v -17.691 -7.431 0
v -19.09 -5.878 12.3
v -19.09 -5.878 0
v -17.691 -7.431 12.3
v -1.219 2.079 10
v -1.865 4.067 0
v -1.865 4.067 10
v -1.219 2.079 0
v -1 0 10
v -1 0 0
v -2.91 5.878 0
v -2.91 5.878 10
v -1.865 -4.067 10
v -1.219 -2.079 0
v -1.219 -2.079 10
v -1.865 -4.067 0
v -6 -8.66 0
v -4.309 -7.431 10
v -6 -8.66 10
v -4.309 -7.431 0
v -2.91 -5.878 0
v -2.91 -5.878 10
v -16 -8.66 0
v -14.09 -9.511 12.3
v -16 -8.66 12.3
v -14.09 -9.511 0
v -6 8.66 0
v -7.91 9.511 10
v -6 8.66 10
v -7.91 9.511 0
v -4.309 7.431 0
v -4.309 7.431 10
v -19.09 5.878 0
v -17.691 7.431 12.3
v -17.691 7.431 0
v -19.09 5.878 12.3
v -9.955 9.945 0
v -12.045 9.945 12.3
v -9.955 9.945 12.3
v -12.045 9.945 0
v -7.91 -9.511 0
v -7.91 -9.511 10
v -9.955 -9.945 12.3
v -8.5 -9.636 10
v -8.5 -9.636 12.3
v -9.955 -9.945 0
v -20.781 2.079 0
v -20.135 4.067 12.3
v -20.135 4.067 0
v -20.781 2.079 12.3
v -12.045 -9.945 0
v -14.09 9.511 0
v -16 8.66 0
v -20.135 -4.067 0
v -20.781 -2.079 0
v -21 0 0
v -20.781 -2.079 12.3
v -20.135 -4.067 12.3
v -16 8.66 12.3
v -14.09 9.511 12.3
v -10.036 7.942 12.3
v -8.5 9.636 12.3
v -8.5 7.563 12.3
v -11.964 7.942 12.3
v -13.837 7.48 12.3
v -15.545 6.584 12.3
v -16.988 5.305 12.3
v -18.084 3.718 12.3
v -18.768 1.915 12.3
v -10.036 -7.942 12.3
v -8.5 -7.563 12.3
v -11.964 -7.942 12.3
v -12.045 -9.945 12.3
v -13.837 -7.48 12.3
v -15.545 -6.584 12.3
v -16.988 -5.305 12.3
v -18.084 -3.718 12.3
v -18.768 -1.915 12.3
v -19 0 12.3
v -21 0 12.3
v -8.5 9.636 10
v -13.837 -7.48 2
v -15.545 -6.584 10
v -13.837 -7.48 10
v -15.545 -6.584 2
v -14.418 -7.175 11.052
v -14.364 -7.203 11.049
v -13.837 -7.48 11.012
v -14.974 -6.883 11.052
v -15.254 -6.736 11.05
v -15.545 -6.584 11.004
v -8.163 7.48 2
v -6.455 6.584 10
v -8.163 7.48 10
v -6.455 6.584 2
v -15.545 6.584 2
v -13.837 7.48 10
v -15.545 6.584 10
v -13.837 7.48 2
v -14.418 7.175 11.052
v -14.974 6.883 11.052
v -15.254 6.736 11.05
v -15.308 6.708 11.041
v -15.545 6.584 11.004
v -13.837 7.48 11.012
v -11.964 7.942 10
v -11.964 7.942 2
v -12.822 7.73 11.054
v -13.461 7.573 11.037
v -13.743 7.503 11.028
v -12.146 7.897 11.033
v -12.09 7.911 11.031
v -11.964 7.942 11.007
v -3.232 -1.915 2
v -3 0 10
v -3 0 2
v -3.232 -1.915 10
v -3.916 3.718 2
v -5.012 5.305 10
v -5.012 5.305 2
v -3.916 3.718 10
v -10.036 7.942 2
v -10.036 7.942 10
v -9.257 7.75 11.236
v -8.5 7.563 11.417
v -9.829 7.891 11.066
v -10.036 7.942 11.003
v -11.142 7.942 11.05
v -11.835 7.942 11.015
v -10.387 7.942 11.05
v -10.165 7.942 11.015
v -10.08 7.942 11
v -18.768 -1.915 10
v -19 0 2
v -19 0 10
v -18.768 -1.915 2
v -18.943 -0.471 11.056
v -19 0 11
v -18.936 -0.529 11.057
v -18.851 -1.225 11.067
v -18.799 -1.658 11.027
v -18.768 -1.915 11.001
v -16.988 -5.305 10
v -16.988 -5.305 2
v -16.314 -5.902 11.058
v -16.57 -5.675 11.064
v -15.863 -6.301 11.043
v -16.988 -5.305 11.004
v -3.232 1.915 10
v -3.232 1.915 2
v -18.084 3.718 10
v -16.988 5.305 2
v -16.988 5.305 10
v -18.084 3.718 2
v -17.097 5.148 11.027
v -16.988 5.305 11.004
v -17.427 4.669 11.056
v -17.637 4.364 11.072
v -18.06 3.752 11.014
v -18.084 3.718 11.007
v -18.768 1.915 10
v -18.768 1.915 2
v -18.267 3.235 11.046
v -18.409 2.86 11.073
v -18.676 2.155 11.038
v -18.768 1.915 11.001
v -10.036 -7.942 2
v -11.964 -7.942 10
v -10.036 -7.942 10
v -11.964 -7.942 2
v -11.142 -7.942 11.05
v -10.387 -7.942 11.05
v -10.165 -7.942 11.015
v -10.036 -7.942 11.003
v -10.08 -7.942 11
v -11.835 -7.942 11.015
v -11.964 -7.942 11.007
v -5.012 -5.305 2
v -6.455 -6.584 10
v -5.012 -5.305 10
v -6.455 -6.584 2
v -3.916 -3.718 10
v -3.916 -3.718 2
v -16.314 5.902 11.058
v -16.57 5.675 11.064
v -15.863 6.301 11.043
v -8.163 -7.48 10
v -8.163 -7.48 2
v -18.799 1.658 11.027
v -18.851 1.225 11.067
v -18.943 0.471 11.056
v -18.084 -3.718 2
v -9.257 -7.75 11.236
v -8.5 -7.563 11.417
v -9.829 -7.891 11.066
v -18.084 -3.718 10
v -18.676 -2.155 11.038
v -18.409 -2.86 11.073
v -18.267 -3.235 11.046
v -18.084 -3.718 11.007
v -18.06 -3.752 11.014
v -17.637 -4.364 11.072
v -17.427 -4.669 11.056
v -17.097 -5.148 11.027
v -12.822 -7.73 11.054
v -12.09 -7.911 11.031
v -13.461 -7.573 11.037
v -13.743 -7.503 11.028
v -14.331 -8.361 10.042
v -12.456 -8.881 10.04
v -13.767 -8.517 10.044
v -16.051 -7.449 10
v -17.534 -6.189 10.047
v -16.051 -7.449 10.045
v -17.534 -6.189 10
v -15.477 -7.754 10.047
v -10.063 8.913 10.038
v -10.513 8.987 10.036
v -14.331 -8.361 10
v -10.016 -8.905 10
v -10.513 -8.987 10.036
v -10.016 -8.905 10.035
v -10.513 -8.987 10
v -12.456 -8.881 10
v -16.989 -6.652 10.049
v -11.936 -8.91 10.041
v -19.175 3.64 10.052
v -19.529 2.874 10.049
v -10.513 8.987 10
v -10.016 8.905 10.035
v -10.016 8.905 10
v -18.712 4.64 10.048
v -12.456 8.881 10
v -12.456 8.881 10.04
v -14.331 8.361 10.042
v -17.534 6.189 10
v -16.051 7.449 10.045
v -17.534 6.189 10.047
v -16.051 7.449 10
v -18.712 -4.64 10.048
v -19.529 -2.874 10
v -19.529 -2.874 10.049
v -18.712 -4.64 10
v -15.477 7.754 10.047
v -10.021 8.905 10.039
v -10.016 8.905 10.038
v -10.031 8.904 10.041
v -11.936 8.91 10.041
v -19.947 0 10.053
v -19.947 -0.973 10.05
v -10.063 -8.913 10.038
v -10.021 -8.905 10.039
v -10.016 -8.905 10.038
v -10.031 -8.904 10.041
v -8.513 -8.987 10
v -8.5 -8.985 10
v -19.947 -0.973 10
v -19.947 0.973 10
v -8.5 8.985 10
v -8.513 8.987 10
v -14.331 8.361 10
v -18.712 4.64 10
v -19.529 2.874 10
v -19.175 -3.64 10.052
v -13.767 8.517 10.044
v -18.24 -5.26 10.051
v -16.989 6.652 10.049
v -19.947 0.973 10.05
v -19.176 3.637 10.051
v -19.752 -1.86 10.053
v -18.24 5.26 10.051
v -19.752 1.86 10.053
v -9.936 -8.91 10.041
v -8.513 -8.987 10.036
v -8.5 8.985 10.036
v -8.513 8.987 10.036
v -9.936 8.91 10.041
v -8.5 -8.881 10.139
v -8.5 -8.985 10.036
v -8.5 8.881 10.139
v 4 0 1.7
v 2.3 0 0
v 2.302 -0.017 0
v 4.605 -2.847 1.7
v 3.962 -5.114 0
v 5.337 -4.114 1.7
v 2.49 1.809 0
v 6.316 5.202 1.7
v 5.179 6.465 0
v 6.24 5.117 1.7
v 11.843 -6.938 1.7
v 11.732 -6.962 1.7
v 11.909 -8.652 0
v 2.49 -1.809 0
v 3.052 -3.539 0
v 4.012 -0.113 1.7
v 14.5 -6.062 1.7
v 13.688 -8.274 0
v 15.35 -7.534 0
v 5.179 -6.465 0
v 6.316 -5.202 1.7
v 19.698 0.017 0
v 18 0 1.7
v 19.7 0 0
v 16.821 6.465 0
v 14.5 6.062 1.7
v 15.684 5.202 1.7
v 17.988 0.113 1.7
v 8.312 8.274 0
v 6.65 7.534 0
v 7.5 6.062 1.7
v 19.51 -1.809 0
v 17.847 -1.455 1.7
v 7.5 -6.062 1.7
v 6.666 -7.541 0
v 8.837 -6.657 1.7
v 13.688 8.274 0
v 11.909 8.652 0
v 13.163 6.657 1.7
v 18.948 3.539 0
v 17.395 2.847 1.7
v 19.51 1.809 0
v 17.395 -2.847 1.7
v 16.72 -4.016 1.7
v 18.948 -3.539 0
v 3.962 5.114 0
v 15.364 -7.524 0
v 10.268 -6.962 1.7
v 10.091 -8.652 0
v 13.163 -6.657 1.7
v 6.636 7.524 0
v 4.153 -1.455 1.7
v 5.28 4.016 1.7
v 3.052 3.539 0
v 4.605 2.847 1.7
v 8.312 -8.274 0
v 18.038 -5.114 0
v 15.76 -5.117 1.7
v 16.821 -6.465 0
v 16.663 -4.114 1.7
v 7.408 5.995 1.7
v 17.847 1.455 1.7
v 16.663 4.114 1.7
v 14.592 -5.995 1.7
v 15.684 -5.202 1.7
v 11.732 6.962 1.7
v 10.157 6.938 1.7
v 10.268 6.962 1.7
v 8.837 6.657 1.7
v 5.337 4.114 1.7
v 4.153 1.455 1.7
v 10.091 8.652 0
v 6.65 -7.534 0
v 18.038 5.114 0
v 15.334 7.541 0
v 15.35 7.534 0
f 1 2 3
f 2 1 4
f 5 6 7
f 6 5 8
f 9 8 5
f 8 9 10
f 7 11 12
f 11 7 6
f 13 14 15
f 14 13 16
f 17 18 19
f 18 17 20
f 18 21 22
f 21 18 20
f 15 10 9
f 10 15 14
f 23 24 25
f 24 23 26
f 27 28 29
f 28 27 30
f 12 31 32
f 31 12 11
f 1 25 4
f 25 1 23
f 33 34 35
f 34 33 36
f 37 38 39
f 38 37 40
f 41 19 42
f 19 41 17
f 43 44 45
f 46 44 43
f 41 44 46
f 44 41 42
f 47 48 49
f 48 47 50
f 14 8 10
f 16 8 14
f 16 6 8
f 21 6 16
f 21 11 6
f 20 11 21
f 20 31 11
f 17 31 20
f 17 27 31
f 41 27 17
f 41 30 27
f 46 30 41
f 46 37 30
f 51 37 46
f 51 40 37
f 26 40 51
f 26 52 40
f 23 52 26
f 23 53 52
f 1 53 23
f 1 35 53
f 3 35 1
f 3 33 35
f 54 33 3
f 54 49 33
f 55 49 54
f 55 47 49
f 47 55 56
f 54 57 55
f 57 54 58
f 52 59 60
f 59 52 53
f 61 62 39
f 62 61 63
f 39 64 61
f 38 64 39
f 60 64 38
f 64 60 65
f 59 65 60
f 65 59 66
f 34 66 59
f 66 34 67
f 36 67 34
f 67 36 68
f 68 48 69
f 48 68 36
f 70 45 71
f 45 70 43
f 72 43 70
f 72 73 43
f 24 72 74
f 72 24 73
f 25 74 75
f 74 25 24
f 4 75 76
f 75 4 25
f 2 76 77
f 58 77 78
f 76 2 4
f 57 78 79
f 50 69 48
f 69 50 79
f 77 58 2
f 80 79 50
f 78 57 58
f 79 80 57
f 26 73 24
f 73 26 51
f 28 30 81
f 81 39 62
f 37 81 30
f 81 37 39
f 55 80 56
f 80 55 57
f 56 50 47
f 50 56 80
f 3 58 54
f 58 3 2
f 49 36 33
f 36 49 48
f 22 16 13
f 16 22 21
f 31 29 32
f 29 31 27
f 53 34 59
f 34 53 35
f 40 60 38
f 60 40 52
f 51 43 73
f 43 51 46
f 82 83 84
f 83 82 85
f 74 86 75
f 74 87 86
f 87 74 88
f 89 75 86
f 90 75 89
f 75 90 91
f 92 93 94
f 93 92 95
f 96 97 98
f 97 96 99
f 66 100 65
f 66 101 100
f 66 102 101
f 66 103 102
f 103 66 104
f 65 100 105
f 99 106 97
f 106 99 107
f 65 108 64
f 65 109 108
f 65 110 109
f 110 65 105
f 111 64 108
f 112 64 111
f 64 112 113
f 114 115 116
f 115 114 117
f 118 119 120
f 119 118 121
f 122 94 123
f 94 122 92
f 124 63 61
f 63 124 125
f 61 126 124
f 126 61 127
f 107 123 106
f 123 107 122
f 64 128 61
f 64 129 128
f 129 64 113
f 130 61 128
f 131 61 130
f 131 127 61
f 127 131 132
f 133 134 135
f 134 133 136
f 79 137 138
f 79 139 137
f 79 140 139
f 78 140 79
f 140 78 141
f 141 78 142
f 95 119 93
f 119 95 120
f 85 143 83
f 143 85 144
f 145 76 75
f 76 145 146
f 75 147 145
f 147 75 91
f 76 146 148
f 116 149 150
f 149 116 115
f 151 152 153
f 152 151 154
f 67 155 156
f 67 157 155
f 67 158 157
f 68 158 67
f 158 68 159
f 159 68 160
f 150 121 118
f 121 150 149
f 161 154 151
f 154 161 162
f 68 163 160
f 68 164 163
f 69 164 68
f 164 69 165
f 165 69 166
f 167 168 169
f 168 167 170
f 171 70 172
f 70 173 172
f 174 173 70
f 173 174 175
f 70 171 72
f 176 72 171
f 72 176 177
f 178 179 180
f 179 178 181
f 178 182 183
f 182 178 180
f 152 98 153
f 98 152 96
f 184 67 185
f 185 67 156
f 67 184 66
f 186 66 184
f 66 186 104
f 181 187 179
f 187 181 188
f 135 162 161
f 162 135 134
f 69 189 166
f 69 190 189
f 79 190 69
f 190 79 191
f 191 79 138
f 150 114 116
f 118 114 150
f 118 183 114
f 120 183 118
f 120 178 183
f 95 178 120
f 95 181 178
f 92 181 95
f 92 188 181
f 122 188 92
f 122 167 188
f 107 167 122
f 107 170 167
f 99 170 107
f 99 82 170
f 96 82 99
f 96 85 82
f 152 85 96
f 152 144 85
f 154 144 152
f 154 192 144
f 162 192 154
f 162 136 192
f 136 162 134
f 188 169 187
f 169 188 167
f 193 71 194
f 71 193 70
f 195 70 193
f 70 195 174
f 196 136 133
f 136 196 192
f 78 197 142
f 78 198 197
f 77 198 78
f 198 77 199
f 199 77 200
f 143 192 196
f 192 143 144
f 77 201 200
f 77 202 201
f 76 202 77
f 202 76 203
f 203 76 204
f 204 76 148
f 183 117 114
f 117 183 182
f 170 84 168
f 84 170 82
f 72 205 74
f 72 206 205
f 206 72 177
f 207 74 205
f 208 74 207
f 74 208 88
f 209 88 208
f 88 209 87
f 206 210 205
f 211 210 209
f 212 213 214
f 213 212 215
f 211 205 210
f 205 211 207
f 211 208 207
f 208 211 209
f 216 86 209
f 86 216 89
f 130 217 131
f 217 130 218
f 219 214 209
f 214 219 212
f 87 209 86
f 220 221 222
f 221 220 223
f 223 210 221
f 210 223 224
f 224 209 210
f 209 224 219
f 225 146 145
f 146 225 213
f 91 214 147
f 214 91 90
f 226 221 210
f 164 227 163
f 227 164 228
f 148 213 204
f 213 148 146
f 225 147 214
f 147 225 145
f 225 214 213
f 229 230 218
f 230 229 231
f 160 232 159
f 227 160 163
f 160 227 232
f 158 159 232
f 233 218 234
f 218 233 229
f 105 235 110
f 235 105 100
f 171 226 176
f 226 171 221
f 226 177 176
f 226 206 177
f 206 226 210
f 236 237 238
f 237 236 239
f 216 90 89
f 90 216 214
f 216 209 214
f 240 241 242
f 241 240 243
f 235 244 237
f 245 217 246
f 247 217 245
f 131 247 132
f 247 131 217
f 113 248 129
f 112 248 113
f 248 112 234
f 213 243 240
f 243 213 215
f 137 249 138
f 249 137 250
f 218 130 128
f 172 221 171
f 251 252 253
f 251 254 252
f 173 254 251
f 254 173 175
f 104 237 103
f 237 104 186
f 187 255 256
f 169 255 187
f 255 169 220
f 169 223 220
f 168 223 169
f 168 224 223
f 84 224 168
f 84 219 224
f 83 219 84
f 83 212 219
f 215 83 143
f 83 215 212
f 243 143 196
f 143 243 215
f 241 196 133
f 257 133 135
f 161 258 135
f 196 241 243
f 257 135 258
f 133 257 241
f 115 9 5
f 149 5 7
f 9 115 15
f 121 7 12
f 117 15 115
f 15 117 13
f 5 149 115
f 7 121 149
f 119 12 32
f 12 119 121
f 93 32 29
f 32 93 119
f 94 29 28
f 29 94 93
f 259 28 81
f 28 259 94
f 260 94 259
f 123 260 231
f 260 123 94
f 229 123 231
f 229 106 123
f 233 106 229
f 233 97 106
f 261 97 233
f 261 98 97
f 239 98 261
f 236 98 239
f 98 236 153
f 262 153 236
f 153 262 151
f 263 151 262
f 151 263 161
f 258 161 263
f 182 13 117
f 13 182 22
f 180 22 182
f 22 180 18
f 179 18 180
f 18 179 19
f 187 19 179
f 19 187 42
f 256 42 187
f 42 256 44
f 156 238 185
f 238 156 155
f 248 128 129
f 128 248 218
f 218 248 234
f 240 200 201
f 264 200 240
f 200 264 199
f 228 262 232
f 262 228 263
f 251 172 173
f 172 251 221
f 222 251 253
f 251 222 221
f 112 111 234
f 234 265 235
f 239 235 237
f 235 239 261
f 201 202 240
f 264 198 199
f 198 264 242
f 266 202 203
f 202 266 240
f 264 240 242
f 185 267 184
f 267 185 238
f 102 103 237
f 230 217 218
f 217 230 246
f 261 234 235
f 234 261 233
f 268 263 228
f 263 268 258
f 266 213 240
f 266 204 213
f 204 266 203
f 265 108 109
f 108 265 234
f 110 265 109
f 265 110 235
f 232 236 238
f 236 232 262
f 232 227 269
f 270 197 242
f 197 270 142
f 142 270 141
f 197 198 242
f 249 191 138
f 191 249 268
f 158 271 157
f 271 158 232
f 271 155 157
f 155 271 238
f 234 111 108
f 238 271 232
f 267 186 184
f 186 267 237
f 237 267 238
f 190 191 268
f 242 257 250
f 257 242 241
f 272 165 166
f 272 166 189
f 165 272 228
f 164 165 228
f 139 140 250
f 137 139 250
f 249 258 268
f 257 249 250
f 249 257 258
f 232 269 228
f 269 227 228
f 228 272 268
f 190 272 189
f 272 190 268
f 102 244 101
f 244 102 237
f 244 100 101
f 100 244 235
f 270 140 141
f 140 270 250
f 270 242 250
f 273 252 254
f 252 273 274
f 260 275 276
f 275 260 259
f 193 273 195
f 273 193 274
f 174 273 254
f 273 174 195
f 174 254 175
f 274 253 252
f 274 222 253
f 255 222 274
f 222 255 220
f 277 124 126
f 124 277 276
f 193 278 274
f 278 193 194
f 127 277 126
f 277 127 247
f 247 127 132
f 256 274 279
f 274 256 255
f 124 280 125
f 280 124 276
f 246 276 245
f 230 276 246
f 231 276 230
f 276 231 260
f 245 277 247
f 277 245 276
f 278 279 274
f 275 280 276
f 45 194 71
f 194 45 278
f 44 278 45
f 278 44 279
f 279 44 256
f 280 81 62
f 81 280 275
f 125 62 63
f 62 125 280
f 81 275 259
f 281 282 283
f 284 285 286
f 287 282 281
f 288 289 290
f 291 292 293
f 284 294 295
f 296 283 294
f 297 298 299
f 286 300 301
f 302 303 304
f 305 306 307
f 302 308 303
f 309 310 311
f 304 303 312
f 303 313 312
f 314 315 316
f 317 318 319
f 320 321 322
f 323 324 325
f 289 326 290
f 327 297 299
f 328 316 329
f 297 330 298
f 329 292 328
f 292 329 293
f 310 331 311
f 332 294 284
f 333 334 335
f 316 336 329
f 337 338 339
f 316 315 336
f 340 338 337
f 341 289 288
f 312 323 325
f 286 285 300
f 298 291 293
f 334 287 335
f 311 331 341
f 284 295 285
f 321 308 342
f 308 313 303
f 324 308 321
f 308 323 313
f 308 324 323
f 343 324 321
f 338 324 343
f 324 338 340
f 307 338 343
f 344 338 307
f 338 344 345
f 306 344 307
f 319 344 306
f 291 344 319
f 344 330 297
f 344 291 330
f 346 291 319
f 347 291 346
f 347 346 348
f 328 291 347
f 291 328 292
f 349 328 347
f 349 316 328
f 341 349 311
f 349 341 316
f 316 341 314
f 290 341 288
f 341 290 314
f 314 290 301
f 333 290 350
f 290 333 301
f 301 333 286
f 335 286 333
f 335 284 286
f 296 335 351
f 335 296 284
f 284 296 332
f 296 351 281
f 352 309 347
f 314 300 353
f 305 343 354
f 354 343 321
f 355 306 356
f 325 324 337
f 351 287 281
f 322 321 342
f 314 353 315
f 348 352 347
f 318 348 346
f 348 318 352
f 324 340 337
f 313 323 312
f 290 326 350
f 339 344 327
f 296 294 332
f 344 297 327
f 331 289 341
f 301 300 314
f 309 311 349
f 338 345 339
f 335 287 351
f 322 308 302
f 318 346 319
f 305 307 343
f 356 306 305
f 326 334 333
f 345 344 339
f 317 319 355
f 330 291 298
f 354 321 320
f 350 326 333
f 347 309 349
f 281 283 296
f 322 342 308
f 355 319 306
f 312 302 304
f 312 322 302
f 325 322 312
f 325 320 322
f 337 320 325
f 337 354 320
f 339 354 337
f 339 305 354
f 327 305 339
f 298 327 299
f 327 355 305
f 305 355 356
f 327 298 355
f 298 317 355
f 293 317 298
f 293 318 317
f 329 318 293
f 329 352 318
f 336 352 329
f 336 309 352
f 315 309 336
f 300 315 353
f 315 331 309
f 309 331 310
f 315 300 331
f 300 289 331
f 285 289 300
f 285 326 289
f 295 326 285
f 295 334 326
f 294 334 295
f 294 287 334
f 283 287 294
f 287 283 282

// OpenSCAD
//Author: Devin Grady
//License: CC BY 3.0 US ( http://creativecommons.org/licenses/by/3.0/us/ )

//Inner radius (open space in interior)
radius = 10; 

//Inner height (open space in interior)
height = 10; 

//Maximum wall thickness; will be cut into to fit lid.
wall = 2; 

//Fit tolerance parameter.
tolerance = .3; 

module cylinder_box(r=radius, h=height, w=wall, tol=tolerance){
	difference(){
		cylinder(r=r,h=h+w+tol);
		translate([0,0,w])cylinder(r=r-w, h = h+w+2*tol);
		translate([0,0,h])cylinder_lid(r=r,w=w, tol = 0);
		translate([w,0,h])cylinder_lid(r=r,w=w, tol = 0);
		translate([r/4, -r, h])cube([2*r, 2*r, r]);
	}
}
module cylinder_lid(r=radius, w=wall, tol = tolerance){
	hull(){difference(){
		cylinder(r=r-w/2, h=w-tol);
		translate([0,0,-tol])rotate_extrude()translate([r-w/2,0,0])rotate([0,0,45])square(r);
	}}
}


translate([-1.1*radius,0,0])cylinder_box();
translate([1.1*radius,0,0])cylinder_lid();
